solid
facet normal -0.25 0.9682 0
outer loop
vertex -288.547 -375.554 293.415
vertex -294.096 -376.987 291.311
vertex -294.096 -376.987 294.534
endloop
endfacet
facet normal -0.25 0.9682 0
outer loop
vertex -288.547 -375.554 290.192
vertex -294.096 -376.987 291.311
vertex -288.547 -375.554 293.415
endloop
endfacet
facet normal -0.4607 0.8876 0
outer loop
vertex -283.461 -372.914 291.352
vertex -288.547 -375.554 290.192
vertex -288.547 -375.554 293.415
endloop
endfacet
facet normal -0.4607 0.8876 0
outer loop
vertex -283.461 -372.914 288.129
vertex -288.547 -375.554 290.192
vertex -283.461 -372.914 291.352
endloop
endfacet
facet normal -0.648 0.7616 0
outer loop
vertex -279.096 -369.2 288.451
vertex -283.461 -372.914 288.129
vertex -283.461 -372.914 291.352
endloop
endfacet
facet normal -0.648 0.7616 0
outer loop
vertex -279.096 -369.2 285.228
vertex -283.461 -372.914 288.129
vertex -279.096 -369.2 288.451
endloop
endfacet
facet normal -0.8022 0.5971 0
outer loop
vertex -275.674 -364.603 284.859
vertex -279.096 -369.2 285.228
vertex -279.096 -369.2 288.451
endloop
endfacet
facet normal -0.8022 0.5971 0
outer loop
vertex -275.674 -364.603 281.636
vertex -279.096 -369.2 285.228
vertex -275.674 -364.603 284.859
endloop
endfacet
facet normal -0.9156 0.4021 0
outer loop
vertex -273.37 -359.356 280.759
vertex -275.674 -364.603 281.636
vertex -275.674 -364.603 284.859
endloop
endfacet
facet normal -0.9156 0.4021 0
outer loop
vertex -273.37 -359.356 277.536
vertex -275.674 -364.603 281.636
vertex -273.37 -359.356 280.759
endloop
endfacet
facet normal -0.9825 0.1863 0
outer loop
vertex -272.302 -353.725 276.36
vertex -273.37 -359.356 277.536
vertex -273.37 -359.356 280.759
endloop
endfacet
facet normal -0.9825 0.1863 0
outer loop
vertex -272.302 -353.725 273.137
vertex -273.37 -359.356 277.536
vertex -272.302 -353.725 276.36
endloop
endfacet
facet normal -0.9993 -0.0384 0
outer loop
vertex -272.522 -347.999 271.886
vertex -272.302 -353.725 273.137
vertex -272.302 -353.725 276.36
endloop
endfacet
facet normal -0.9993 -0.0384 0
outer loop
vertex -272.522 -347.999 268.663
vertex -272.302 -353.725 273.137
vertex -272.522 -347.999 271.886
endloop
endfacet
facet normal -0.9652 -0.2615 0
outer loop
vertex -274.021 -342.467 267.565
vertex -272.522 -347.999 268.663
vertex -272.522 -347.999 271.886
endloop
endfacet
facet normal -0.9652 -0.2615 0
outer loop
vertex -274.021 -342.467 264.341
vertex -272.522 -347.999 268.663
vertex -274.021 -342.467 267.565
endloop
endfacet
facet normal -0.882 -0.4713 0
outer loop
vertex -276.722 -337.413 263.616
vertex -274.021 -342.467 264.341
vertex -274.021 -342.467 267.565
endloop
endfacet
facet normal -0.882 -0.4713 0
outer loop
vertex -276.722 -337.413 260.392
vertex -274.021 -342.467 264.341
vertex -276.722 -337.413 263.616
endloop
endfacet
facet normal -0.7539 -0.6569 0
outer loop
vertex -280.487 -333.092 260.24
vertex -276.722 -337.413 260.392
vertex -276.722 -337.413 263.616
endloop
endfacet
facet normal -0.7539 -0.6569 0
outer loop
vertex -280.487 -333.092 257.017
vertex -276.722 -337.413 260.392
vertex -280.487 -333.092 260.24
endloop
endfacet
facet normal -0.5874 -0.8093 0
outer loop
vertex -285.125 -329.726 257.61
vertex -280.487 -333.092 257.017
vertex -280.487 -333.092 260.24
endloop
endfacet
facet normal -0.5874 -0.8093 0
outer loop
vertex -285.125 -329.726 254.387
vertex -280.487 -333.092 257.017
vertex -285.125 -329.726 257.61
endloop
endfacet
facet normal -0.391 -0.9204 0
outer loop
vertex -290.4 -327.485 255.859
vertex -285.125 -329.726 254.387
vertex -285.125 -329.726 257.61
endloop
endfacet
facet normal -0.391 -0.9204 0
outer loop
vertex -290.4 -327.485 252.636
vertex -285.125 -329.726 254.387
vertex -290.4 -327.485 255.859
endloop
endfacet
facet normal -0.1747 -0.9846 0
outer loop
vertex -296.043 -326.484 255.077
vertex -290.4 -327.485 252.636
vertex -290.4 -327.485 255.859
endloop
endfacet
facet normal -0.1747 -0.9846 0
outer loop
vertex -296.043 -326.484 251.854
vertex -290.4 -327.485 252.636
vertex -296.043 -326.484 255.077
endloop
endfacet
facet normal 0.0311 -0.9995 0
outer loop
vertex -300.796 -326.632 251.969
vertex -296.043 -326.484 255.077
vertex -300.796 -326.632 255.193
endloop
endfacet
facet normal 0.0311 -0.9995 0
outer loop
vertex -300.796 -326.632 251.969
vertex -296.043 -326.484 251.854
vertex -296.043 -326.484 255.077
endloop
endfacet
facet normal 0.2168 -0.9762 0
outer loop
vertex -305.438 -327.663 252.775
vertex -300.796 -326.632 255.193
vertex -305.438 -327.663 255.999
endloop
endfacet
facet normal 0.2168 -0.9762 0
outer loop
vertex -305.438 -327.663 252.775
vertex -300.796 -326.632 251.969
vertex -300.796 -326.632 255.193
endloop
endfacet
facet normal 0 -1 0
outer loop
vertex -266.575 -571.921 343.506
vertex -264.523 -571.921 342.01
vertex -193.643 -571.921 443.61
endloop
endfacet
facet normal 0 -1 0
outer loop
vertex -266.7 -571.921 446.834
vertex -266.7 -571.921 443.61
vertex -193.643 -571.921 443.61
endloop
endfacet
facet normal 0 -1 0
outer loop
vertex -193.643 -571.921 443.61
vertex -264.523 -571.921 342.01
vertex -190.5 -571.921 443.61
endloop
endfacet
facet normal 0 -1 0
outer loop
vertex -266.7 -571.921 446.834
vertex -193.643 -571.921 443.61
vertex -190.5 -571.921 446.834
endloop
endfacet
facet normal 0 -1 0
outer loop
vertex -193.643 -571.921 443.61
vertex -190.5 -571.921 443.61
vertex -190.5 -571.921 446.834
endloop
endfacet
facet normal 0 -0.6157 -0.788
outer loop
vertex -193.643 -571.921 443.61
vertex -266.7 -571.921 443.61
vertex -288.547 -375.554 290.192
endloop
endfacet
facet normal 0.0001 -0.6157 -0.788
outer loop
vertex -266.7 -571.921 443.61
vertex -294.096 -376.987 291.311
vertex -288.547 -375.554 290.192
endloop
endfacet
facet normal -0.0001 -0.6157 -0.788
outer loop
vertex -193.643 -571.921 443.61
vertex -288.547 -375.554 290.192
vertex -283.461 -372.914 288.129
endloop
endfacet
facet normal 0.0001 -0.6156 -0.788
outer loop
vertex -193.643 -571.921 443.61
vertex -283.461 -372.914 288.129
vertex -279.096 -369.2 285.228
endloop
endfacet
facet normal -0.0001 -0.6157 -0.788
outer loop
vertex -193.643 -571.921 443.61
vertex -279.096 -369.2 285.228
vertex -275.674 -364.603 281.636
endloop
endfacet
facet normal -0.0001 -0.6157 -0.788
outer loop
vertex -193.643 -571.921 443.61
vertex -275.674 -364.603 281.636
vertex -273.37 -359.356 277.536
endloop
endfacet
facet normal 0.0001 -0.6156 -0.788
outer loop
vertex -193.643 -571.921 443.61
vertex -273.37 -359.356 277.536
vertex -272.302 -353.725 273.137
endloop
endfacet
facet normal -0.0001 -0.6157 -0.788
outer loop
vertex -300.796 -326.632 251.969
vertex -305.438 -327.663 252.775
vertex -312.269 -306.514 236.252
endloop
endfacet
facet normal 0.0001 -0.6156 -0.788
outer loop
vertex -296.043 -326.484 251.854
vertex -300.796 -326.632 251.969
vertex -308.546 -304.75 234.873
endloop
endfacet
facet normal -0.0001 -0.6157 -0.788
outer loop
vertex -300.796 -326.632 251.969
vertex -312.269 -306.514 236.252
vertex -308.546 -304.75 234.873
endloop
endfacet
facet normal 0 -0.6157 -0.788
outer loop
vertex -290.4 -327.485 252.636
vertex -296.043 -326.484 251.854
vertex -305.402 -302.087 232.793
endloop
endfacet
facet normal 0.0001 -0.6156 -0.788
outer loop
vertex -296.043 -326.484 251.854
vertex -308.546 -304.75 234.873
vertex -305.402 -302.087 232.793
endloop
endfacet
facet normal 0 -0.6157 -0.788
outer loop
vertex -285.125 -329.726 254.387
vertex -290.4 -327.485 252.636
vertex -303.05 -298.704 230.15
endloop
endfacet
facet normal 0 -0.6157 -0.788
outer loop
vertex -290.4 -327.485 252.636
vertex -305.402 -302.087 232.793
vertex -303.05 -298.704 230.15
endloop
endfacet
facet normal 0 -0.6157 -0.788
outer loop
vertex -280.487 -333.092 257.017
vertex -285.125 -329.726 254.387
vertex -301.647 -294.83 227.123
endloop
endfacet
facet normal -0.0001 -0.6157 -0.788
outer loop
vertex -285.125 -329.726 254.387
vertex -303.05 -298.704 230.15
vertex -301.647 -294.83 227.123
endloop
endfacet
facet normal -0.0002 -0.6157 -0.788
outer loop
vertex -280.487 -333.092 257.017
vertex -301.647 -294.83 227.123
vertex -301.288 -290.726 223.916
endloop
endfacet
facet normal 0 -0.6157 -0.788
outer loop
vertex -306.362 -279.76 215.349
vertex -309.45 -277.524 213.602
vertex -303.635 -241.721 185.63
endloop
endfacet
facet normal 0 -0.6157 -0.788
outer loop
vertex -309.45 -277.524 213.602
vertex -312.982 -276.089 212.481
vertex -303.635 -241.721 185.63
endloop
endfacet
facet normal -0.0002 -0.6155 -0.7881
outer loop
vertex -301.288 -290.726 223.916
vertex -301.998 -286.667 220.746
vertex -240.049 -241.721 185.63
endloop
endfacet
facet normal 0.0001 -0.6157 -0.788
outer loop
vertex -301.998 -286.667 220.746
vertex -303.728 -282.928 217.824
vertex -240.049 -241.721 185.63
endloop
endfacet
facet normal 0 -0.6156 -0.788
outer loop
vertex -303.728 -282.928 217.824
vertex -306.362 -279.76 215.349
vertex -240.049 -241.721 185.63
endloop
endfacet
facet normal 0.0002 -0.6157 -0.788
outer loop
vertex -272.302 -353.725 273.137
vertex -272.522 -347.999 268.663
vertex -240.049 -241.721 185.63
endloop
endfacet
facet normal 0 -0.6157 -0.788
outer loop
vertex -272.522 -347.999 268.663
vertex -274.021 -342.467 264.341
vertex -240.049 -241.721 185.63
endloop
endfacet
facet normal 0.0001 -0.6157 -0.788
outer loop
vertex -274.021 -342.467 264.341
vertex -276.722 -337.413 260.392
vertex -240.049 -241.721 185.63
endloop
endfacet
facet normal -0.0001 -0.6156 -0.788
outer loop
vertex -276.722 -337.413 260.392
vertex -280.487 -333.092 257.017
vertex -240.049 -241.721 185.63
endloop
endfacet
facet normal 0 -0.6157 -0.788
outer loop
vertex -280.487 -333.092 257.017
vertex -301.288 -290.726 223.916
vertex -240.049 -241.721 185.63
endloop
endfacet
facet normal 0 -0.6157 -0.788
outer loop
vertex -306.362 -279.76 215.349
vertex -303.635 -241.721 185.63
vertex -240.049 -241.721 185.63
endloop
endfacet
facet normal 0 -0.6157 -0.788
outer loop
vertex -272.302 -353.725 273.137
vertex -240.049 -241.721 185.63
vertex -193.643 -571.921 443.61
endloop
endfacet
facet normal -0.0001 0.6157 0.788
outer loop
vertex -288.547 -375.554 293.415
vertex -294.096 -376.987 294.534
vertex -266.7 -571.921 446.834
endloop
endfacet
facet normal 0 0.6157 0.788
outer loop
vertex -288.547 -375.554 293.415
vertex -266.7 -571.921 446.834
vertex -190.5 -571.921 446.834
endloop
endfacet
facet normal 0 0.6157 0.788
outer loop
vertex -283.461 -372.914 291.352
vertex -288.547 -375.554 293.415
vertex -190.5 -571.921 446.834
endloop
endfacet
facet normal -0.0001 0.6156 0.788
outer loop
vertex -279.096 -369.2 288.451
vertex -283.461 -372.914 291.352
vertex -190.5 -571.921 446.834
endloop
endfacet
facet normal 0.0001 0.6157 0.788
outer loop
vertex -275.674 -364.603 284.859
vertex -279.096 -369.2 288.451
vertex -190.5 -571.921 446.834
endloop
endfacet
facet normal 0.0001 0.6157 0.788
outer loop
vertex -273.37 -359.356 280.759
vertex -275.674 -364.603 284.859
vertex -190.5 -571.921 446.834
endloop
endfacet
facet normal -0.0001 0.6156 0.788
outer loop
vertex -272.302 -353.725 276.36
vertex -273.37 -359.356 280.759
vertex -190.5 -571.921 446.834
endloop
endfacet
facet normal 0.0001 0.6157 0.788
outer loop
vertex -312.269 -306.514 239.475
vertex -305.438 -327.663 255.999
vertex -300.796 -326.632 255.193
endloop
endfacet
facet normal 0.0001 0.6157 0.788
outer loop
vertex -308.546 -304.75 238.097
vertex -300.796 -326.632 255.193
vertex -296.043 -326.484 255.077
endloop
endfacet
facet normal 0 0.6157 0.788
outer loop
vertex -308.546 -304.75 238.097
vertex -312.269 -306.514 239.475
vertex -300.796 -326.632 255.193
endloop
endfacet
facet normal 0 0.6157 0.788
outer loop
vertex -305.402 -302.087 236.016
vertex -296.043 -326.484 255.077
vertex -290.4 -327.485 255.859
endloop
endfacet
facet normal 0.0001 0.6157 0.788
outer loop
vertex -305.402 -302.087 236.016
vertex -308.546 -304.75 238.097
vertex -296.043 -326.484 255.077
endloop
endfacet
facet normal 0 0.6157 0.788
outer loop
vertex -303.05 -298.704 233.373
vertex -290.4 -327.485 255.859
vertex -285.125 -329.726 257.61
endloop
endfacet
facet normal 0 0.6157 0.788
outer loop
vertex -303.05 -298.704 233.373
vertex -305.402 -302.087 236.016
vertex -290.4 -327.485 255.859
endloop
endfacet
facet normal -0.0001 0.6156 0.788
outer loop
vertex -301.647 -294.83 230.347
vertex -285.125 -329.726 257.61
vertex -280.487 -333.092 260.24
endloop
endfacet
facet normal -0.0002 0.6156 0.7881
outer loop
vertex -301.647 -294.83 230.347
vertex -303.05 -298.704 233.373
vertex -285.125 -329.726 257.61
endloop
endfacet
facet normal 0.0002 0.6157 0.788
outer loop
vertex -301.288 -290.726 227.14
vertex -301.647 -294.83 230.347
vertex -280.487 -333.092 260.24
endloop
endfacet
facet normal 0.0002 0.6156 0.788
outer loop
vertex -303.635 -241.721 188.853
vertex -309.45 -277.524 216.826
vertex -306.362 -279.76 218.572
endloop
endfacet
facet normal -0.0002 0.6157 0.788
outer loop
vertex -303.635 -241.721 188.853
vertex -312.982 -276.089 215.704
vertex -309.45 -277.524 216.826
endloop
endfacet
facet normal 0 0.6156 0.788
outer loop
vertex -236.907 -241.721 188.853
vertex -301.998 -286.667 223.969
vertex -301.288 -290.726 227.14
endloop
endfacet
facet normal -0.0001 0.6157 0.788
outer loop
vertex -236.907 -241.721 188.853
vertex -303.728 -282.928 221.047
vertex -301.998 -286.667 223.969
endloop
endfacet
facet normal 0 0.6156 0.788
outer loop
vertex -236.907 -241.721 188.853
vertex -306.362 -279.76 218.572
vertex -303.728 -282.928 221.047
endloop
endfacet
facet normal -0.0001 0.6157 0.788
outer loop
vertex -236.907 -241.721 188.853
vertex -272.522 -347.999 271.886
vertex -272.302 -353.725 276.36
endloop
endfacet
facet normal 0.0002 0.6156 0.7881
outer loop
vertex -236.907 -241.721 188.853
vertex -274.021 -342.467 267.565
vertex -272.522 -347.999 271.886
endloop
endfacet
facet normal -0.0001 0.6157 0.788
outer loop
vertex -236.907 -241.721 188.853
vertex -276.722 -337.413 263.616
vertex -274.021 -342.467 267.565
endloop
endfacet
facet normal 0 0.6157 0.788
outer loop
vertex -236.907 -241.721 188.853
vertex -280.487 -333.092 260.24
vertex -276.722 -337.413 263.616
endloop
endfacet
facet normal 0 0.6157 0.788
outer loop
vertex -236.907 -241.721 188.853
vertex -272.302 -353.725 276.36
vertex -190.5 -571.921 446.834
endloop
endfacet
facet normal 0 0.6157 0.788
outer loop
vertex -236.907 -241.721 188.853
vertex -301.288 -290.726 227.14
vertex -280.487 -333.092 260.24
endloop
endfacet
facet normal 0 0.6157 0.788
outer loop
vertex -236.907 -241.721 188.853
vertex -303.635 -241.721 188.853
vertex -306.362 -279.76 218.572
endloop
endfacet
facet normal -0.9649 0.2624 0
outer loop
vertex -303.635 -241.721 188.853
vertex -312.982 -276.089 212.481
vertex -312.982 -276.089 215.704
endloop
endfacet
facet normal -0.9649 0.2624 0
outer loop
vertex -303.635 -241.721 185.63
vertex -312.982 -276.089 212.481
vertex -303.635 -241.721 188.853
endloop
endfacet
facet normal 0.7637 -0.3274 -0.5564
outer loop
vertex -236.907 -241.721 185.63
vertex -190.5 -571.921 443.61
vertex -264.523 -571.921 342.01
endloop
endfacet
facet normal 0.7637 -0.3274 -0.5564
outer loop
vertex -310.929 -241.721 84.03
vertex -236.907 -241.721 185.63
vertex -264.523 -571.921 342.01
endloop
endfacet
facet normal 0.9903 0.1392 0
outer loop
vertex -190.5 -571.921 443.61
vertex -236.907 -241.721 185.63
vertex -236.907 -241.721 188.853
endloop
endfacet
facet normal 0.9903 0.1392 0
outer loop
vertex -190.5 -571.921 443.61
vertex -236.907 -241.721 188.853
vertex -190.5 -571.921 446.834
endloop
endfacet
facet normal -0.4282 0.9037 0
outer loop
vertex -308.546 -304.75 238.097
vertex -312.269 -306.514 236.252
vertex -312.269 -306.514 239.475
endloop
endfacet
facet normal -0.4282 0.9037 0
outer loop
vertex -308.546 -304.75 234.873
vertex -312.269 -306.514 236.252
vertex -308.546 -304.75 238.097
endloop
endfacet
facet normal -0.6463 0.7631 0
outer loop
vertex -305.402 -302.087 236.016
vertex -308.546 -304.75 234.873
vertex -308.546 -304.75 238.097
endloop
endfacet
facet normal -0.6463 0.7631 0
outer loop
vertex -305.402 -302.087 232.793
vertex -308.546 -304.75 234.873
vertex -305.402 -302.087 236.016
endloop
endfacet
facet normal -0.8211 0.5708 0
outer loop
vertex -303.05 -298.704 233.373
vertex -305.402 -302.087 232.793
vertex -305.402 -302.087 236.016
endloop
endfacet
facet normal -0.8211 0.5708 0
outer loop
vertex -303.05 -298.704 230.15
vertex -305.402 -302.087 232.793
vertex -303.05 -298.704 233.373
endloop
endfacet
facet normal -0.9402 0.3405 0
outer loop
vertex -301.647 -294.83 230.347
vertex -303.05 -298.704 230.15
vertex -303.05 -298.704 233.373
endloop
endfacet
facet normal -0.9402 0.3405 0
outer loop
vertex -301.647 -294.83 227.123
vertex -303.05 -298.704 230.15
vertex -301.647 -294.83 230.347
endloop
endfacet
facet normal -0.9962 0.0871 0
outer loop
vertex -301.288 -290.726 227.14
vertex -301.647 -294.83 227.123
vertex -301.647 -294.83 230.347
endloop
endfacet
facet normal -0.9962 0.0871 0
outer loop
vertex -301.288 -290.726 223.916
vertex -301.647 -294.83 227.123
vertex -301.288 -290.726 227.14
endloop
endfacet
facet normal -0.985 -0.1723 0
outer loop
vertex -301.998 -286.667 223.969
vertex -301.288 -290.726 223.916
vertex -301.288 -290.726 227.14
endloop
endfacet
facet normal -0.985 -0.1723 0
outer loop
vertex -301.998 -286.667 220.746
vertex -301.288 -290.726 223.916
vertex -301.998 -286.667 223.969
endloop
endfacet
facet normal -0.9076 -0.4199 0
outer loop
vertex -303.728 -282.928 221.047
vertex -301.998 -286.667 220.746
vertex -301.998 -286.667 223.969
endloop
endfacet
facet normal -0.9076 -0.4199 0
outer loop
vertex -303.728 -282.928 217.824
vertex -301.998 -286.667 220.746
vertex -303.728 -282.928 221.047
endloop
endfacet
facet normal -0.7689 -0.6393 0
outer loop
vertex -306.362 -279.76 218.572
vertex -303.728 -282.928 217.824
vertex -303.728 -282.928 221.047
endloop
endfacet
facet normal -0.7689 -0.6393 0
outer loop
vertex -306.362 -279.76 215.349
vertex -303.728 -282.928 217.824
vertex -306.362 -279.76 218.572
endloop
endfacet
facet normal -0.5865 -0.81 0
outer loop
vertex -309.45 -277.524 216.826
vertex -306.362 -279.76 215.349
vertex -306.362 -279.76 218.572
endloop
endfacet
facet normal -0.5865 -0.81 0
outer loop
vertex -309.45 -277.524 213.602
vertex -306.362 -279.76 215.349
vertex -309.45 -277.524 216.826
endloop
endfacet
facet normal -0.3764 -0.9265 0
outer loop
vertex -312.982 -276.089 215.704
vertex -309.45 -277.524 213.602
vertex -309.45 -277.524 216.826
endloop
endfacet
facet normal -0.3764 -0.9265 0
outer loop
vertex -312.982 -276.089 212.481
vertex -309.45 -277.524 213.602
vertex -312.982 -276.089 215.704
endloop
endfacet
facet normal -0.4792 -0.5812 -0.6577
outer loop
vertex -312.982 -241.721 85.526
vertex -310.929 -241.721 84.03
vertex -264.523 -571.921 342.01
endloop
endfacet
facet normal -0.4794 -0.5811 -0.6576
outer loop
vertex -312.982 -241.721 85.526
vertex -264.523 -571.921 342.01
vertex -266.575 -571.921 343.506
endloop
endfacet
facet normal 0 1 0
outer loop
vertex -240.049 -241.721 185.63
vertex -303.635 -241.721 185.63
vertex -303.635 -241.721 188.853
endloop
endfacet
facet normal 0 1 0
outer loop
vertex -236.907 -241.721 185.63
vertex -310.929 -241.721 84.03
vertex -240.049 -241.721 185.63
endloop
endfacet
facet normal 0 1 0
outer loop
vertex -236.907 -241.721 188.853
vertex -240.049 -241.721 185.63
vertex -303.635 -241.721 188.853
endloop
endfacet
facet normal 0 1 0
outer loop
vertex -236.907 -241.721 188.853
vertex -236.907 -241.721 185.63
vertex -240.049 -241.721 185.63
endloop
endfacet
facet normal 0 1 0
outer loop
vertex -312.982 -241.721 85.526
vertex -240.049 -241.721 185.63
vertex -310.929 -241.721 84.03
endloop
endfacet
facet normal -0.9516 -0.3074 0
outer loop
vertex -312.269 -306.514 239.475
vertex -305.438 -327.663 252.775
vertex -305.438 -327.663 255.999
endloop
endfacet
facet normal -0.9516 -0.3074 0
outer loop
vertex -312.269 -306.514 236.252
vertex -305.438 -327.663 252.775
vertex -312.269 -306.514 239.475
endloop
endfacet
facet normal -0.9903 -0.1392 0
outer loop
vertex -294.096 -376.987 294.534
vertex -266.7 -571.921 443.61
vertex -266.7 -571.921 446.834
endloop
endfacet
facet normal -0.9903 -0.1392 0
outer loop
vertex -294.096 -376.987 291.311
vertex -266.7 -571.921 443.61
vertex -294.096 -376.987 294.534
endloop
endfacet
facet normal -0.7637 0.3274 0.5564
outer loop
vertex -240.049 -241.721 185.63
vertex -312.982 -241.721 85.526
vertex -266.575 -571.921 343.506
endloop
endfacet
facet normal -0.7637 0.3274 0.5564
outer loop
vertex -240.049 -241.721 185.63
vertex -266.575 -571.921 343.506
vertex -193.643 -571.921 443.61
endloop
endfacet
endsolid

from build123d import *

# Parameters (mm, degrees)
BOSS_EXTRUDE1_DEPTH     = 2.54
SKETCH3_W               = 635
SKETCH3_H               = 1270
BOSS_EXTRUDE2_DEPTH     = 2.54
CUT_EXTRUDE1_DEPTH      = 1311.281906829
CUT_EXTRUDE1_DEPTH_BACK = 1311.281906829
SKETCH4_OUTSIDE_W       = 934.392
SKETCH4_OUTSIDE_H       = 1301.729


with BuildPart() as part:
    # Sketch2 → Boss-Extrude1 (new body)
    with BuildSketch(Plane(origin=(0, 0, 0), x_dir=(1, 0, 0), z_dir=(0, 1, 0))):
        with BuildLine():
            Line((-190.5, 0), (190.5, 0))
            Line((190.5, 0), (172.589792707, 64.649970609))
            ThreePointArc((172.589792707, 64.649970609), (148.320865378, 100.476994518), (107.315, 114.3))
            Line((107.315, 114.3), (-107.315, 114.3))
            ThreePointArc((-107.315, 114.3), (-148.320865378, 100.476994518), (-172.589792707, 64.649970609))
            Line((-172.589792707, 64.649970609), (-190.5, 0))
        make_face()
    extrude(amount=-BOSS_EXTRUDE1_DEPTH)

    # Sketch3 → Boss-Extrude2 (add)
    with BuildSketch(Plane(origin=(0, 0, 0), x_dir=(1, 0, 0), z_dir=(0, 0.6156614753256567, 0.7880107536067232))):
        with Locations((0, -635)):
            Rectangle(SKETCH3_W, SKETCH3_H)
    extrude(amount=-BOSS_EXTRUDE2_DEPTH)

    # Sketch4 outside → Cut-Extrude1 (cut, two sides: drawn at the far end of the back side and taken through both)
    with BuildSketch(Plane.XY.offset(-CUT_EXTRUDE1_DEPTH_BACK)):
        with Locations((0, -501.1685)):
            Rectangle(SKETCH4_OUTSIDE_W, SKETCH4_OUTSIDE_H)
        with BuildLine():
            Line((-266.7, -571.921009662), (-190.5, -571.921009662))
            Line((-190.5, -571.921009662), (-236.906583619, -241.721009662))
            Line((-236.906583619, -241.721009662), (-303.634542969, -241.721009662))
            Line((-303.634542969, -241.721009662), (-312.982021819, -276.089162217))
            ThreePointArc((-312.982021819, -276.089162217), (-304.535747178, -281.767279678), (-301.273366919, -291.407686738))
            ThreePointArc((-301.273366919, -291.407686738), (-304.313369935, -300.749981822), (-312.269080611, -306.514247899))
            Line((-312.269080611, -306.514247899), (-305.43807978, -327.663433526))
            ThreePointArc((-305.43807978, -327.663433526), (-282.683549554, -331.297936211), (-272.231221688, -351.833931384))
            ThreePointArc((-272.231221688, -351.833931384), (-278.461598351, -368.497830721), (-294.096224924, -376.98674033))
            Line((-294.096224924, -376.98674033), (-266.7, -571.921009662))
        make_face(mode=Mode.SUBTRACT)
    extrude(amount=CUT_EXTRUDE1_DEPTH + CUT_EXTRUDE1_DEPTH_BACK, mode=Mode.SUBTRACT)

    # Sweep1: sweep along a curve in space
    with BuildLine() as sweep1_path:
        Line((-236.906583619, -241.721009662, 185.629844207), (-190.5, -571.921009662, 443.61035808))
    # Sketch8 → Sweep1 (sweep)
    with BuildSketch(Plane(origin=(0, -241.721009662, 0), x_dir=(1, 0, 0), z_dir=(0, 1, 0))):
        Polygon((-236.906583619, -185.629844207), (-310.929097821, -84.029844207), (-312.982021819, -85.525539048), (-240.049223095, -185.629844207), align=None)
    sweep(path=sweep1_path.line)


solid = part.part
